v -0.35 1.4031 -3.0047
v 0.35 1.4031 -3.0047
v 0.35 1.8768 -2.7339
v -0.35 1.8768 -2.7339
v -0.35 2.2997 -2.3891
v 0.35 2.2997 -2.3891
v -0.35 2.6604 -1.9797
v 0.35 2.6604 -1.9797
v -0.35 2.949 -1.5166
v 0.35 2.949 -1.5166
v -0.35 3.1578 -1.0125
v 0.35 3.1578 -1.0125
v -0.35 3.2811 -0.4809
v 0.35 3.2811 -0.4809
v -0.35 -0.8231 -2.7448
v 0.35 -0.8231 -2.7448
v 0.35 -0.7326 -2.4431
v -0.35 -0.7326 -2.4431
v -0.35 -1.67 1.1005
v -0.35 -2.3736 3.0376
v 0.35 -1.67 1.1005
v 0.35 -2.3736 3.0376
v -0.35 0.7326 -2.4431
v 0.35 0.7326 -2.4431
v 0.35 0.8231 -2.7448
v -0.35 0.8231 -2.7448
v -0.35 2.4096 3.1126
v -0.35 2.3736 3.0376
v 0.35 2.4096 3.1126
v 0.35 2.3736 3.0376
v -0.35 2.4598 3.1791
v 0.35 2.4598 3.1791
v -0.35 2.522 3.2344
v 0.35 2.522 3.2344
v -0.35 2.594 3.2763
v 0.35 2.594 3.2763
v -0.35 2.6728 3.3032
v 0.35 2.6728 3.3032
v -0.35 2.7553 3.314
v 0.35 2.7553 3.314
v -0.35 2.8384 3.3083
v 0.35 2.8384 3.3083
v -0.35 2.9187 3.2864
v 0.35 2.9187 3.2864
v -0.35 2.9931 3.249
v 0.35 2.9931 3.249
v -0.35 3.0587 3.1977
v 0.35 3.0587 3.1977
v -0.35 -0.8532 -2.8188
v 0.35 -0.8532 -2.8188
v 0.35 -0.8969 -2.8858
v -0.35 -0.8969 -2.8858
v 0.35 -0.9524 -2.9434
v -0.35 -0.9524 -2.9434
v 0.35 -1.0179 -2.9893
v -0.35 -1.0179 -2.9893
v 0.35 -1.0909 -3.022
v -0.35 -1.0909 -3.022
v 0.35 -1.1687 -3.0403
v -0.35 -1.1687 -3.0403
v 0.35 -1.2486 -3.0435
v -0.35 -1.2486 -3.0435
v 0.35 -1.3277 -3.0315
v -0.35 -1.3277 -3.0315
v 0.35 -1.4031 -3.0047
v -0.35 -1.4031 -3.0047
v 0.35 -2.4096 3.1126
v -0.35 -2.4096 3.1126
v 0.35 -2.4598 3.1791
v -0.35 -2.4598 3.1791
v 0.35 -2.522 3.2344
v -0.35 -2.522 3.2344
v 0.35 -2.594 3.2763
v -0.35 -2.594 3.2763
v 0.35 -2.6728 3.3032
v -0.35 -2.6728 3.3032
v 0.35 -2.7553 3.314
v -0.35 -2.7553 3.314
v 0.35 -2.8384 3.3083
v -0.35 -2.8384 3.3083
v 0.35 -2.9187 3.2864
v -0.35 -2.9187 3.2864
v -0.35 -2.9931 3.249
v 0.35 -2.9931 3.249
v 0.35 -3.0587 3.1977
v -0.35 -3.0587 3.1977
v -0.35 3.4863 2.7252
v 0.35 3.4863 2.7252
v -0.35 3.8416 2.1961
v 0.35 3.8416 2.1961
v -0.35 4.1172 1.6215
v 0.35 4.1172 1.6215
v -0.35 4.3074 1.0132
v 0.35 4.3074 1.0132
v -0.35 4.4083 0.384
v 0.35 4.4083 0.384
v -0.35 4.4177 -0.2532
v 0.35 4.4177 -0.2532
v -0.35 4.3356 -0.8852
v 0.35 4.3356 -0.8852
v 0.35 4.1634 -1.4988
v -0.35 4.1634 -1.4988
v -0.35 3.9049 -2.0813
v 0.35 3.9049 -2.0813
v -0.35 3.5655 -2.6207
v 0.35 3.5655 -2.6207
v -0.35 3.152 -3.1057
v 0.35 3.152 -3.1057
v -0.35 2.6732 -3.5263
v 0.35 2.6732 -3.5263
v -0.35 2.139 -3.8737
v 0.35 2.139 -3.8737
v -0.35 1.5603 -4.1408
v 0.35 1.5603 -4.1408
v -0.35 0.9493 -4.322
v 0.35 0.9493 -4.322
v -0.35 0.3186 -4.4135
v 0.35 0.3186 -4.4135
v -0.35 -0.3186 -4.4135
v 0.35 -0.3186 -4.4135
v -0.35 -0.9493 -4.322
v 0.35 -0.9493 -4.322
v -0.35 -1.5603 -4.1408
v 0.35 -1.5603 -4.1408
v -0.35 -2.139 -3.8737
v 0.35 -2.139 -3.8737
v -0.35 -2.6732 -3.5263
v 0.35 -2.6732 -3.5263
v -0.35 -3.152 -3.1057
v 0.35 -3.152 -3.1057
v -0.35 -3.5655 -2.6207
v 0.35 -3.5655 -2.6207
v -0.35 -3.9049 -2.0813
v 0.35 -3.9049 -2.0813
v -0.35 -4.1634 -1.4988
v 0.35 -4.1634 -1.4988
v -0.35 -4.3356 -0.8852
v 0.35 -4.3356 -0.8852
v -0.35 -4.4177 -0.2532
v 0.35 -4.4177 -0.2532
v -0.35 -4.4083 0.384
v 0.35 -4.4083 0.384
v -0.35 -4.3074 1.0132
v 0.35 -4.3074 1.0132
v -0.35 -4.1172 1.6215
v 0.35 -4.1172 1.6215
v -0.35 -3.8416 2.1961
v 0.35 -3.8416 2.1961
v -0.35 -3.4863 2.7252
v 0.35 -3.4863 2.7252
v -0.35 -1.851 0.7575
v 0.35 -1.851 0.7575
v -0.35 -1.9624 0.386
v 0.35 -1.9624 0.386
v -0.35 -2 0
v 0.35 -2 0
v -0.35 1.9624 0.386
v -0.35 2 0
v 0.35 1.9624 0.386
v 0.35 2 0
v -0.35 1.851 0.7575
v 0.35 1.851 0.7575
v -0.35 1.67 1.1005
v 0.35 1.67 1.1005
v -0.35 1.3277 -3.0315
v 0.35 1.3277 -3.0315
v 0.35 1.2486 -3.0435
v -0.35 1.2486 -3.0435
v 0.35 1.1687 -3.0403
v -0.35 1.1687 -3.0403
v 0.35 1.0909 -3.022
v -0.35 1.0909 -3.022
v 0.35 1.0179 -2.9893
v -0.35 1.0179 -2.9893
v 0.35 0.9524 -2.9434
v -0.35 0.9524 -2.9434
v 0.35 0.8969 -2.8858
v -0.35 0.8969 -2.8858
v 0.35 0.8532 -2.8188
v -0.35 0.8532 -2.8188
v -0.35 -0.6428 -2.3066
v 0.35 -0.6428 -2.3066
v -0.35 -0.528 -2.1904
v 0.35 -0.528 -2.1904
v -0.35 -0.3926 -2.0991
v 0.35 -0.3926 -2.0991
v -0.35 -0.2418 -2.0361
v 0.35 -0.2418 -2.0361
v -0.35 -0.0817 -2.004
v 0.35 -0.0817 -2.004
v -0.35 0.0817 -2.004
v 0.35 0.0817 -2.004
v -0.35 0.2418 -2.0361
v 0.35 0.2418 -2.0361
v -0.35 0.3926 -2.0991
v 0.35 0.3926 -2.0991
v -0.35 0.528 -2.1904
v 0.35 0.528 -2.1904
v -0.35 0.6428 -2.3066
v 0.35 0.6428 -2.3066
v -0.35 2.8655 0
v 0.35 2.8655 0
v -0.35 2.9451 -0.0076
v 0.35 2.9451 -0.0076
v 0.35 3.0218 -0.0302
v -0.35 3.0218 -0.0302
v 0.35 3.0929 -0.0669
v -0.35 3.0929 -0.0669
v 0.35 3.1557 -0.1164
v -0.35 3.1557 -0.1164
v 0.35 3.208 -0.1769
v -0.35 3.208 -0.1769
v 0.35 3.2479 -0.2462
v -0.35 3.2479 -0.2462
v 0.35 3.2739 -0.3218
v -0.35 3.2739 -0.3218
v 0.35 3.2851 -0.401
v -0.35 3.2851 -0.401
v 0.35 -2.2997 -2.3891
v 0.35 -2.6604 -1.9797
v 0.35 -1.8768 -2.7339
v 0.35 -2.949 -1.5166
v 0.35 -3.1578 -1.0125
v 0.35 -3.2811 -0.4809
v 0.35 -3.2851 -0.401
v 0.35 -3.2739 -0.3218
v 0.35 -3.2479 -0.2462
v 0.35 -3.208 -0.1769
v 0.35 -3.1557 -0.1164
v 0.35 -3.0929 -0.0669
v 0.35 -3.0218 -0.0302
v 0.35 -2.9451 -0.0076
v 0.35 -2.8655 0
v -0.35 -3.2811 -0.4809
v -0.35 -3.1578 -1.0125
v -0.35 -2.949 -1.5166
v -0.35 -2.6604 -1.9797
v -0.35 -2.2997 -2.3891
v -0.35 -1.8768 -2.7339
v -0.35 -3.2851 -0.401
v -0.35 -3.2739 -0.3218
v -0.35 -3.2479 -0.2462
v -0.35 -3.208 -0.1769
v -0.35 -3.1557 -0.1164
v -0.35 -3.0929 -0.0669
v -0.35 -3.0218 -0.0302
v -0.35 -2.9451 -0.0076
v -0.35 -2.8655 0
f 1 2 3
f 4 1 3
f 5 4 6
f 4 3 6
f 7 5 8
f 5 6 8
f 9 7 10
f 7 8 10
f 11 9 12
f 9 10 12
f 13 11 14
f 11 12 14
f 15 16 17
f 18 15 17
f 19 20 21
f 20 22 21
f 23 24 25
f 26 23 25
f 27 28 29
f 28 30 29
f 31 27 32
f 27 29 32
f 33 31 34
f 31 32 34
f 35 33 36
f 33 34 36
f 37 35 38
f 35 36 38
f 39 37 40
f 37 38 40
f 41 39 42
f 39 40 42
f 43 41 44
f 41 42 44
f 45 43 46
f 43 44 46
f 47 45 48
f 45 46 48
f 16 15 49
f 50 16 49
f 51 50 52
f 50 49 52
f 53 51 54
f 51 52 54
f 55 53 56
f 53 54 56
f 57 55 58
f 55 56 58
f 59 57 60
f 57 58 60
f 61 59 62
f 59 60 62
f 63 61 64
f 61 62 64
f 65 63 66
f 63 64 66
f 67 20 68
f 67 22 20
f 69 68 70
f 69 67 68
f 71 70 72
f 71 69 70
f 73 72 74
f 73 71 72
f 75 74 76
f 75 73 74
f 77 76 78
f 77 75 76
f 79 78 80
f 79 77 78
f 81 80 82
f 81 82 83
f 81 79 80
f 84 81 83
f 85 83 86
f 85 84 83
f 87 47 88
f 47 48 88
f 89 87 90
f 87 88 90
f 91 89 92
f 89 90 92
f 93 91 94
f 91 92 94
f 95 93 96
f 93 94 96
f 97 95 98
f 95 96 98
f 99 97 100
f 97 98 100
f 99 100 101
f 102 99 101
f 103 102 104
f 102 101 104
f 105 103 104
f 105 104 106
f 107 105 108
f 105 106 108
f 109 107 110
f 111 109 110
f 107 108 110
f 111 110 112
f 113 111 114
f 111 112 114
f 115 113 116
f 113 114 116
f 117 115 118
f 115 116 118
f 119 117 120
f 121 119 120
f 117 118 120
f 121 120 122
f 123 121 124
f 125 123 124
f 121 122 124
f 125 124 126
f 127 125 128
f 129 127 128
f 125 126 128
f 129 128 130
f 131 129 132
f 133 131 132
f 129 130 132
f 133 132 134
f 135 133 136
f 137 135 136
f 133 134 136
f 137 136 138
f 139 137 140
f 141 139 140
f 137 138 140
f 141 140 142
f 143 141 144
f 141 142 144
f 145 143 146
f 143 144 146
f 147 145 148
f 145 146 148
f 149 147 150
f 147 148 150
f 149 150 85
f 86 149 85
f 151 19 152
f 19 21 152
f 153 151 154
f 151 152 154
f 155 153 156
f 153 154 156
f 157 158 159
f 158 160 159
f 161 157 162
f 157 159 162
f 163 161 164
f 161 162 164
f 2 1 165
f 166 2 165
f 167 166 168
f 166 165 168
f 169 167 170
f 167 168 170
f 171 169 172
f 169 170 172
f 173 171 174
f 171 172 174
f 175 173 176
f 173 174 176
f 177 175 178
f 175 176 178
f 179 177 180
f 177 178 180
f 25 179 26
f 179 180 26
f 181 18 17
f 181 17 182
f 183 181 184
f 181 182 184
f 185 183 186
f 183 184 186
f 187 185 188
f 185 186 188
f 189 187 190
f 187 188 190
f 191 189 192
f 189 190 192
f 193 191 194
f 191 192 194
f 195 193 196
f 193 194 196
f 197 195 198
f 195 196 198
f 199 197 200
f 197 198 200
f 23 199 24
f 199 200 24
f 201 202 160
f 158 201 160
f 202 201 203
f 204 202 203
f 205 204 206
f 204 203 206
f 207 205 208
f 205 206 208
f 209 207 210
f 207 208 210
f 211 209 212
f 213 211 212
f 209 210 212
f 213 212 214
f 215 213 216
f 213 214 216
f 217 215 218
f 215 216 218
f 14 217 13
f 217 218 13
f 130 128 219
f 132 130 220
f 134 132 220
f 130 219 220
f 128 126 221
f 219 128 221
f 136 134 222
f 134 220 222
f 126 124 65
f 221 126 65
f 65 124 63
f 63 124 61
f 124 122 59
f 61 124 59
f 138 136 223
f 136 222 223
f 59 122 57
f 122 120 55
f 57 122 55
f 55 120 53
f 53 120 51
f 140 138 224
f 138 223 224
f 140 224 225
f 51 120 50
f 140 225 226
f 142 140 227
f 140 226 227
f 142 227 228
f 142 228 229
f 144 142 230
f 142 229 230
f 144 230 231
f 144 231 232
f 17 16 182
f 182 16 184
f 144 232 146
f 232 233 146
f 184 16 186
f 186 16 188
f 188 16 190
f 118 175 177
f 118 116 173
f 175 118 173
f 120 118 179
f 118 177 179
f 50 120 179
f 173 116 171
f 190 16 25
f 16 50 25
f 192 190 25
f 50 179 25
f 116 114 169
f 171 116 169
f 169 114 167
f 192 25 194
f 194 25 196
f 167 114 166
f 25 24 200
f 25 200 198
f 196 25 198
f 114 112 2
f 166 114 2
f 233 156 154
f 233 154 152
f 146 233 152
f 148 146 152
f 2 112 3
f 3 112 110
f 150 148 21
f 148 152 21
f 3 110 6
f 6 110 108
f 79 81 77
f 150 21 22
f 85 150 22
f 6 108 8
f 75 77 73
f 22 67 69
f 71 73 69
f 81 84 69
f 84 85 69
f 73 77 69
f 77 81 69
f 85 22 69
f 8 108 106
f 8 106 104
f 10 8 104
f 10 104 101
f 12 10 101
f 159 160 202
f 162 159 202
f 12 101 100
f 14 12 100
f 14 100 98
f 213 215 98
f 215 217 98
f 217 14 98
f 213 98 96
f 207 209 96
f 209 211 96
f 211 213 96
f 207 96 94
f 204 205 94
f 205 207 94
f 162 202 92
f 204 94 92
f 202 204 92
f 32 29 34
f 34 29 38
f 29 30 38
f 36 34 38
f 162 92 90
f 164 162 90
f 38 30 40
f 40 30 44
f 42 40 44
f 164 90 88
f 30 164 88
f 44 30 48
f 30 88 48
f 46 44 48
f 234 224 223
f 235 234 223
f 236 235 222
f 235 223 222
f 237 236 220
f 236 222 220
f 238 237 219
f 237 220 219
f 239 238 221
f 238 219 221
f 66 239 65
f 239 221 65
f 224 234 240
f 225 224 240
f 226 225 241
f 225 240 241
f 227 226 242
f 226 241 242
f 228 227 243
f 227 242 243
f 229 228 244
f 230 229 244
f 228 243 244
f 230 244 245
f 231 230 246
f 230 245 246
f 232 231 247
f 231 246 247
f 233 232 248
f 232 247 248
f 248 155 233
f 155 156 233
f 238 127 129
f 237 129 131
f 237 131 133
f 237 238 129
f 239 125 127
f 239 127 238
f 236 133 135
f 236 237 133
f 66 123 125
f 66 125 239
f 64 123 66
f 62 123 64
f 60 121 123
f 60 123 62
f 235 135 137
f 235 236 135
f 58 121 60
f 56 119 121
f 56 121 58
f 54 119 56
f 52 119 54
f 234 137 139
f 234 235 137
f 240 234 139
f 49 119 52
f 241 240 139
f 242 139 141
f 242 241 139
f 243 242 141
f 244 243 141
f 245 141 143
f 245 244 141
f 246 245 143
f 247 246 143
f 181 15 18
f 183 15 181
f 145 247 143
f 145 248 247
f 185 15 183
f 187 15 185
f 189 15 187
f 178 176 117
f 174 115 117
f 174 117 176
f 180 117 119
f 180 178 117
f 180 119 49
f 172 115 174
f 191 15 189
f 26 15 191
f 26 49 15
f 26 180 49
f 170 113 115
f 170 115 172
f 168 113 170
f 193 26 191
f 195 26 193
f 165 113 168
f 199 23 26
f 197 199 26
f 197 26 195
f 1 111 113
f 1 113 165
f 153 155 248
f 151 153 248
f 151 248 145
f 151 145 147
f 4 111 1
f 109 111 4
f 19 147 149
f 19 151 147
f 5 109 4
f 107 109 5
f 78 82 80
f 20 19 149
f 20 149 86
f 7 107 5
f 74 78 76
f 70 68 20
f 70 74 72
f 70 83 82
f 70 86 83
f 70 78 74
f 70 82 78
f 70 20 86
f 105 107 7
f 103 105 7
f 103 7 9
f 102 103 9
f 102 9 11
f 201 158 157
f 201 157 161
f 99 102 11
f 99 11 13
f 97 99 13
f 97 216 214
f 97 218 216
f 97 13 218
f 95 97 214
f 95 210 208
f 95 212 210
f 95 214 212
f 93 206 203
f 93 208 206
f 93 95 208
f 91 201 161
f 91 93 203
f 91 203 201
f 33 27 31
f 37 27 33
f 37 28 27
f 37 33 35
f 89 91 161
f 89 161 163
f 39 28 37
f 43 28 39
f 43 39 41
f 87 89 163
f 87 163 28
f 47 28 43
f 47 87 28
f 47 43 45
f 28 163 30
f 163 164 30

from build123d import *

# Parameters (mm, degrees)
EXTRUDE1_DEPTH          = 0.35
FILLET1_R               = 0.42
CUT_EXTRUDE1_DEPTH      = 7.267675008
CUT_EXTRUDE1_DEPTH_BACK = 7.267675008


with BuildPart() as part:
    # Sketch1 → Extrude1 (new, symmetric)
    with BuildSketch(Plane(origin=(0, 0, 0), x_dir=(0, 0, -1), z_dir=(1, 0, 0))):
        with BuildLine():
            Line((-3.59727207, -2.576869934), (-1.100499886, -1.67))
            ThreePointArc((-1.100499886, -1.67), (-0.574456265, -1.915724406), (0, -2))
            Line((0, -2), (0, -3.316129032))
            ThreePointArc((0, -3.316129032), (1.979664969, -2.660383125), (3.17639466, -0.952485548))
            Line((3.17639466, -0.952485548), (1.915724406, -0.574456265))
            ThreePointArc((1.915724406, -0.574456265), (2, 0), (1.915724406, 0.574456265))
            Line((1.915724406, 0.574456265), (3.17639466, 0.952485548))
            ThreePointArc((3.17639466, 0.952485548), (1.979664969, 2.660383125), (0, 3.316129032))
            Line((0, 3.316129032), (0, 2))
            ThreePointArc((0, 2), (-0.574456265, 1.915724406), (-1.100499886, 1.67))
            Line((-1.100499886, 1.67), (-3.59727207, 2.576869934))
            ThreePointArc((-3.59727207, 2.576869934), (4.425, 0), (-3.59727207, -2.576869934))
        make_face()
    extrude(amount=EXTRUDE1_DEPTH, both=True)

    # Fillet1
    fillet1_edges = [part.edges().sort_by_distance(p)[0] for p in [
        (0, -3.316129032, 0),
        (0, 3.316129032, 0),
        (0, -2.576869934, 3.59727207),
        (0, 2.576869934, 3.59727207),
        (0, -0.952485548, -3.17639466),
        (0, 0.952485548, -3.17639466),
    ]]
    fillet(fillet1_edges, radius=FILLET1_R)

    # Sketch4 → Cut-Extrude1 (cut, two sides: drawn at the far end of the back side and taken through both)
    with BuildSketch(Plane(origin=(0, 0, 0), x_dir=(0, 0, -1), z_dir=(1, 0, 0)).offset(-CUT_EXTRUDE1_DEPTH_BACK)):
        with BuildLine():
            ThreePointArc((0.480908888, 3.281072751), (0.145392765, 3.183303361), (0, 2.865512759))
            Line((0, 2.865512759), (0, -2.865512759))
            ThreePointArc((0, -2.865512759), (0.145392765, -3.183303361), (0.480908888, -3.281072751))
            ThreePointArc((0.480908888, -3.281072751), (1.979664969, -2.660383125), (3.004685012, -1.403060846))
            ThreePointArc((3.004685012, -1.403060846), (3.007405078, -1.053600513), (2.744766364, -0.823055878))
            ThreePointArc((2.744766364, -0.823055878), (2, 0), (2.744766364, 0.823055878))
            ThreePointArc((2.744766364, 0.823055878), (3.007405078, 1.053600513), (3.004685012, 1.403060846))
            ThreePointArc((3.004685012, 1.403060846), (1.979664969, 2.660383125), (0.480908888, 3.281072751))
        make_face()
    extrude(amount=CUT_EXTRUDE1_DEPTH + CUT_EXTRUDE1_DEPTH_BACK, mode=Mode.SUBTRACT)


solid = part.part
